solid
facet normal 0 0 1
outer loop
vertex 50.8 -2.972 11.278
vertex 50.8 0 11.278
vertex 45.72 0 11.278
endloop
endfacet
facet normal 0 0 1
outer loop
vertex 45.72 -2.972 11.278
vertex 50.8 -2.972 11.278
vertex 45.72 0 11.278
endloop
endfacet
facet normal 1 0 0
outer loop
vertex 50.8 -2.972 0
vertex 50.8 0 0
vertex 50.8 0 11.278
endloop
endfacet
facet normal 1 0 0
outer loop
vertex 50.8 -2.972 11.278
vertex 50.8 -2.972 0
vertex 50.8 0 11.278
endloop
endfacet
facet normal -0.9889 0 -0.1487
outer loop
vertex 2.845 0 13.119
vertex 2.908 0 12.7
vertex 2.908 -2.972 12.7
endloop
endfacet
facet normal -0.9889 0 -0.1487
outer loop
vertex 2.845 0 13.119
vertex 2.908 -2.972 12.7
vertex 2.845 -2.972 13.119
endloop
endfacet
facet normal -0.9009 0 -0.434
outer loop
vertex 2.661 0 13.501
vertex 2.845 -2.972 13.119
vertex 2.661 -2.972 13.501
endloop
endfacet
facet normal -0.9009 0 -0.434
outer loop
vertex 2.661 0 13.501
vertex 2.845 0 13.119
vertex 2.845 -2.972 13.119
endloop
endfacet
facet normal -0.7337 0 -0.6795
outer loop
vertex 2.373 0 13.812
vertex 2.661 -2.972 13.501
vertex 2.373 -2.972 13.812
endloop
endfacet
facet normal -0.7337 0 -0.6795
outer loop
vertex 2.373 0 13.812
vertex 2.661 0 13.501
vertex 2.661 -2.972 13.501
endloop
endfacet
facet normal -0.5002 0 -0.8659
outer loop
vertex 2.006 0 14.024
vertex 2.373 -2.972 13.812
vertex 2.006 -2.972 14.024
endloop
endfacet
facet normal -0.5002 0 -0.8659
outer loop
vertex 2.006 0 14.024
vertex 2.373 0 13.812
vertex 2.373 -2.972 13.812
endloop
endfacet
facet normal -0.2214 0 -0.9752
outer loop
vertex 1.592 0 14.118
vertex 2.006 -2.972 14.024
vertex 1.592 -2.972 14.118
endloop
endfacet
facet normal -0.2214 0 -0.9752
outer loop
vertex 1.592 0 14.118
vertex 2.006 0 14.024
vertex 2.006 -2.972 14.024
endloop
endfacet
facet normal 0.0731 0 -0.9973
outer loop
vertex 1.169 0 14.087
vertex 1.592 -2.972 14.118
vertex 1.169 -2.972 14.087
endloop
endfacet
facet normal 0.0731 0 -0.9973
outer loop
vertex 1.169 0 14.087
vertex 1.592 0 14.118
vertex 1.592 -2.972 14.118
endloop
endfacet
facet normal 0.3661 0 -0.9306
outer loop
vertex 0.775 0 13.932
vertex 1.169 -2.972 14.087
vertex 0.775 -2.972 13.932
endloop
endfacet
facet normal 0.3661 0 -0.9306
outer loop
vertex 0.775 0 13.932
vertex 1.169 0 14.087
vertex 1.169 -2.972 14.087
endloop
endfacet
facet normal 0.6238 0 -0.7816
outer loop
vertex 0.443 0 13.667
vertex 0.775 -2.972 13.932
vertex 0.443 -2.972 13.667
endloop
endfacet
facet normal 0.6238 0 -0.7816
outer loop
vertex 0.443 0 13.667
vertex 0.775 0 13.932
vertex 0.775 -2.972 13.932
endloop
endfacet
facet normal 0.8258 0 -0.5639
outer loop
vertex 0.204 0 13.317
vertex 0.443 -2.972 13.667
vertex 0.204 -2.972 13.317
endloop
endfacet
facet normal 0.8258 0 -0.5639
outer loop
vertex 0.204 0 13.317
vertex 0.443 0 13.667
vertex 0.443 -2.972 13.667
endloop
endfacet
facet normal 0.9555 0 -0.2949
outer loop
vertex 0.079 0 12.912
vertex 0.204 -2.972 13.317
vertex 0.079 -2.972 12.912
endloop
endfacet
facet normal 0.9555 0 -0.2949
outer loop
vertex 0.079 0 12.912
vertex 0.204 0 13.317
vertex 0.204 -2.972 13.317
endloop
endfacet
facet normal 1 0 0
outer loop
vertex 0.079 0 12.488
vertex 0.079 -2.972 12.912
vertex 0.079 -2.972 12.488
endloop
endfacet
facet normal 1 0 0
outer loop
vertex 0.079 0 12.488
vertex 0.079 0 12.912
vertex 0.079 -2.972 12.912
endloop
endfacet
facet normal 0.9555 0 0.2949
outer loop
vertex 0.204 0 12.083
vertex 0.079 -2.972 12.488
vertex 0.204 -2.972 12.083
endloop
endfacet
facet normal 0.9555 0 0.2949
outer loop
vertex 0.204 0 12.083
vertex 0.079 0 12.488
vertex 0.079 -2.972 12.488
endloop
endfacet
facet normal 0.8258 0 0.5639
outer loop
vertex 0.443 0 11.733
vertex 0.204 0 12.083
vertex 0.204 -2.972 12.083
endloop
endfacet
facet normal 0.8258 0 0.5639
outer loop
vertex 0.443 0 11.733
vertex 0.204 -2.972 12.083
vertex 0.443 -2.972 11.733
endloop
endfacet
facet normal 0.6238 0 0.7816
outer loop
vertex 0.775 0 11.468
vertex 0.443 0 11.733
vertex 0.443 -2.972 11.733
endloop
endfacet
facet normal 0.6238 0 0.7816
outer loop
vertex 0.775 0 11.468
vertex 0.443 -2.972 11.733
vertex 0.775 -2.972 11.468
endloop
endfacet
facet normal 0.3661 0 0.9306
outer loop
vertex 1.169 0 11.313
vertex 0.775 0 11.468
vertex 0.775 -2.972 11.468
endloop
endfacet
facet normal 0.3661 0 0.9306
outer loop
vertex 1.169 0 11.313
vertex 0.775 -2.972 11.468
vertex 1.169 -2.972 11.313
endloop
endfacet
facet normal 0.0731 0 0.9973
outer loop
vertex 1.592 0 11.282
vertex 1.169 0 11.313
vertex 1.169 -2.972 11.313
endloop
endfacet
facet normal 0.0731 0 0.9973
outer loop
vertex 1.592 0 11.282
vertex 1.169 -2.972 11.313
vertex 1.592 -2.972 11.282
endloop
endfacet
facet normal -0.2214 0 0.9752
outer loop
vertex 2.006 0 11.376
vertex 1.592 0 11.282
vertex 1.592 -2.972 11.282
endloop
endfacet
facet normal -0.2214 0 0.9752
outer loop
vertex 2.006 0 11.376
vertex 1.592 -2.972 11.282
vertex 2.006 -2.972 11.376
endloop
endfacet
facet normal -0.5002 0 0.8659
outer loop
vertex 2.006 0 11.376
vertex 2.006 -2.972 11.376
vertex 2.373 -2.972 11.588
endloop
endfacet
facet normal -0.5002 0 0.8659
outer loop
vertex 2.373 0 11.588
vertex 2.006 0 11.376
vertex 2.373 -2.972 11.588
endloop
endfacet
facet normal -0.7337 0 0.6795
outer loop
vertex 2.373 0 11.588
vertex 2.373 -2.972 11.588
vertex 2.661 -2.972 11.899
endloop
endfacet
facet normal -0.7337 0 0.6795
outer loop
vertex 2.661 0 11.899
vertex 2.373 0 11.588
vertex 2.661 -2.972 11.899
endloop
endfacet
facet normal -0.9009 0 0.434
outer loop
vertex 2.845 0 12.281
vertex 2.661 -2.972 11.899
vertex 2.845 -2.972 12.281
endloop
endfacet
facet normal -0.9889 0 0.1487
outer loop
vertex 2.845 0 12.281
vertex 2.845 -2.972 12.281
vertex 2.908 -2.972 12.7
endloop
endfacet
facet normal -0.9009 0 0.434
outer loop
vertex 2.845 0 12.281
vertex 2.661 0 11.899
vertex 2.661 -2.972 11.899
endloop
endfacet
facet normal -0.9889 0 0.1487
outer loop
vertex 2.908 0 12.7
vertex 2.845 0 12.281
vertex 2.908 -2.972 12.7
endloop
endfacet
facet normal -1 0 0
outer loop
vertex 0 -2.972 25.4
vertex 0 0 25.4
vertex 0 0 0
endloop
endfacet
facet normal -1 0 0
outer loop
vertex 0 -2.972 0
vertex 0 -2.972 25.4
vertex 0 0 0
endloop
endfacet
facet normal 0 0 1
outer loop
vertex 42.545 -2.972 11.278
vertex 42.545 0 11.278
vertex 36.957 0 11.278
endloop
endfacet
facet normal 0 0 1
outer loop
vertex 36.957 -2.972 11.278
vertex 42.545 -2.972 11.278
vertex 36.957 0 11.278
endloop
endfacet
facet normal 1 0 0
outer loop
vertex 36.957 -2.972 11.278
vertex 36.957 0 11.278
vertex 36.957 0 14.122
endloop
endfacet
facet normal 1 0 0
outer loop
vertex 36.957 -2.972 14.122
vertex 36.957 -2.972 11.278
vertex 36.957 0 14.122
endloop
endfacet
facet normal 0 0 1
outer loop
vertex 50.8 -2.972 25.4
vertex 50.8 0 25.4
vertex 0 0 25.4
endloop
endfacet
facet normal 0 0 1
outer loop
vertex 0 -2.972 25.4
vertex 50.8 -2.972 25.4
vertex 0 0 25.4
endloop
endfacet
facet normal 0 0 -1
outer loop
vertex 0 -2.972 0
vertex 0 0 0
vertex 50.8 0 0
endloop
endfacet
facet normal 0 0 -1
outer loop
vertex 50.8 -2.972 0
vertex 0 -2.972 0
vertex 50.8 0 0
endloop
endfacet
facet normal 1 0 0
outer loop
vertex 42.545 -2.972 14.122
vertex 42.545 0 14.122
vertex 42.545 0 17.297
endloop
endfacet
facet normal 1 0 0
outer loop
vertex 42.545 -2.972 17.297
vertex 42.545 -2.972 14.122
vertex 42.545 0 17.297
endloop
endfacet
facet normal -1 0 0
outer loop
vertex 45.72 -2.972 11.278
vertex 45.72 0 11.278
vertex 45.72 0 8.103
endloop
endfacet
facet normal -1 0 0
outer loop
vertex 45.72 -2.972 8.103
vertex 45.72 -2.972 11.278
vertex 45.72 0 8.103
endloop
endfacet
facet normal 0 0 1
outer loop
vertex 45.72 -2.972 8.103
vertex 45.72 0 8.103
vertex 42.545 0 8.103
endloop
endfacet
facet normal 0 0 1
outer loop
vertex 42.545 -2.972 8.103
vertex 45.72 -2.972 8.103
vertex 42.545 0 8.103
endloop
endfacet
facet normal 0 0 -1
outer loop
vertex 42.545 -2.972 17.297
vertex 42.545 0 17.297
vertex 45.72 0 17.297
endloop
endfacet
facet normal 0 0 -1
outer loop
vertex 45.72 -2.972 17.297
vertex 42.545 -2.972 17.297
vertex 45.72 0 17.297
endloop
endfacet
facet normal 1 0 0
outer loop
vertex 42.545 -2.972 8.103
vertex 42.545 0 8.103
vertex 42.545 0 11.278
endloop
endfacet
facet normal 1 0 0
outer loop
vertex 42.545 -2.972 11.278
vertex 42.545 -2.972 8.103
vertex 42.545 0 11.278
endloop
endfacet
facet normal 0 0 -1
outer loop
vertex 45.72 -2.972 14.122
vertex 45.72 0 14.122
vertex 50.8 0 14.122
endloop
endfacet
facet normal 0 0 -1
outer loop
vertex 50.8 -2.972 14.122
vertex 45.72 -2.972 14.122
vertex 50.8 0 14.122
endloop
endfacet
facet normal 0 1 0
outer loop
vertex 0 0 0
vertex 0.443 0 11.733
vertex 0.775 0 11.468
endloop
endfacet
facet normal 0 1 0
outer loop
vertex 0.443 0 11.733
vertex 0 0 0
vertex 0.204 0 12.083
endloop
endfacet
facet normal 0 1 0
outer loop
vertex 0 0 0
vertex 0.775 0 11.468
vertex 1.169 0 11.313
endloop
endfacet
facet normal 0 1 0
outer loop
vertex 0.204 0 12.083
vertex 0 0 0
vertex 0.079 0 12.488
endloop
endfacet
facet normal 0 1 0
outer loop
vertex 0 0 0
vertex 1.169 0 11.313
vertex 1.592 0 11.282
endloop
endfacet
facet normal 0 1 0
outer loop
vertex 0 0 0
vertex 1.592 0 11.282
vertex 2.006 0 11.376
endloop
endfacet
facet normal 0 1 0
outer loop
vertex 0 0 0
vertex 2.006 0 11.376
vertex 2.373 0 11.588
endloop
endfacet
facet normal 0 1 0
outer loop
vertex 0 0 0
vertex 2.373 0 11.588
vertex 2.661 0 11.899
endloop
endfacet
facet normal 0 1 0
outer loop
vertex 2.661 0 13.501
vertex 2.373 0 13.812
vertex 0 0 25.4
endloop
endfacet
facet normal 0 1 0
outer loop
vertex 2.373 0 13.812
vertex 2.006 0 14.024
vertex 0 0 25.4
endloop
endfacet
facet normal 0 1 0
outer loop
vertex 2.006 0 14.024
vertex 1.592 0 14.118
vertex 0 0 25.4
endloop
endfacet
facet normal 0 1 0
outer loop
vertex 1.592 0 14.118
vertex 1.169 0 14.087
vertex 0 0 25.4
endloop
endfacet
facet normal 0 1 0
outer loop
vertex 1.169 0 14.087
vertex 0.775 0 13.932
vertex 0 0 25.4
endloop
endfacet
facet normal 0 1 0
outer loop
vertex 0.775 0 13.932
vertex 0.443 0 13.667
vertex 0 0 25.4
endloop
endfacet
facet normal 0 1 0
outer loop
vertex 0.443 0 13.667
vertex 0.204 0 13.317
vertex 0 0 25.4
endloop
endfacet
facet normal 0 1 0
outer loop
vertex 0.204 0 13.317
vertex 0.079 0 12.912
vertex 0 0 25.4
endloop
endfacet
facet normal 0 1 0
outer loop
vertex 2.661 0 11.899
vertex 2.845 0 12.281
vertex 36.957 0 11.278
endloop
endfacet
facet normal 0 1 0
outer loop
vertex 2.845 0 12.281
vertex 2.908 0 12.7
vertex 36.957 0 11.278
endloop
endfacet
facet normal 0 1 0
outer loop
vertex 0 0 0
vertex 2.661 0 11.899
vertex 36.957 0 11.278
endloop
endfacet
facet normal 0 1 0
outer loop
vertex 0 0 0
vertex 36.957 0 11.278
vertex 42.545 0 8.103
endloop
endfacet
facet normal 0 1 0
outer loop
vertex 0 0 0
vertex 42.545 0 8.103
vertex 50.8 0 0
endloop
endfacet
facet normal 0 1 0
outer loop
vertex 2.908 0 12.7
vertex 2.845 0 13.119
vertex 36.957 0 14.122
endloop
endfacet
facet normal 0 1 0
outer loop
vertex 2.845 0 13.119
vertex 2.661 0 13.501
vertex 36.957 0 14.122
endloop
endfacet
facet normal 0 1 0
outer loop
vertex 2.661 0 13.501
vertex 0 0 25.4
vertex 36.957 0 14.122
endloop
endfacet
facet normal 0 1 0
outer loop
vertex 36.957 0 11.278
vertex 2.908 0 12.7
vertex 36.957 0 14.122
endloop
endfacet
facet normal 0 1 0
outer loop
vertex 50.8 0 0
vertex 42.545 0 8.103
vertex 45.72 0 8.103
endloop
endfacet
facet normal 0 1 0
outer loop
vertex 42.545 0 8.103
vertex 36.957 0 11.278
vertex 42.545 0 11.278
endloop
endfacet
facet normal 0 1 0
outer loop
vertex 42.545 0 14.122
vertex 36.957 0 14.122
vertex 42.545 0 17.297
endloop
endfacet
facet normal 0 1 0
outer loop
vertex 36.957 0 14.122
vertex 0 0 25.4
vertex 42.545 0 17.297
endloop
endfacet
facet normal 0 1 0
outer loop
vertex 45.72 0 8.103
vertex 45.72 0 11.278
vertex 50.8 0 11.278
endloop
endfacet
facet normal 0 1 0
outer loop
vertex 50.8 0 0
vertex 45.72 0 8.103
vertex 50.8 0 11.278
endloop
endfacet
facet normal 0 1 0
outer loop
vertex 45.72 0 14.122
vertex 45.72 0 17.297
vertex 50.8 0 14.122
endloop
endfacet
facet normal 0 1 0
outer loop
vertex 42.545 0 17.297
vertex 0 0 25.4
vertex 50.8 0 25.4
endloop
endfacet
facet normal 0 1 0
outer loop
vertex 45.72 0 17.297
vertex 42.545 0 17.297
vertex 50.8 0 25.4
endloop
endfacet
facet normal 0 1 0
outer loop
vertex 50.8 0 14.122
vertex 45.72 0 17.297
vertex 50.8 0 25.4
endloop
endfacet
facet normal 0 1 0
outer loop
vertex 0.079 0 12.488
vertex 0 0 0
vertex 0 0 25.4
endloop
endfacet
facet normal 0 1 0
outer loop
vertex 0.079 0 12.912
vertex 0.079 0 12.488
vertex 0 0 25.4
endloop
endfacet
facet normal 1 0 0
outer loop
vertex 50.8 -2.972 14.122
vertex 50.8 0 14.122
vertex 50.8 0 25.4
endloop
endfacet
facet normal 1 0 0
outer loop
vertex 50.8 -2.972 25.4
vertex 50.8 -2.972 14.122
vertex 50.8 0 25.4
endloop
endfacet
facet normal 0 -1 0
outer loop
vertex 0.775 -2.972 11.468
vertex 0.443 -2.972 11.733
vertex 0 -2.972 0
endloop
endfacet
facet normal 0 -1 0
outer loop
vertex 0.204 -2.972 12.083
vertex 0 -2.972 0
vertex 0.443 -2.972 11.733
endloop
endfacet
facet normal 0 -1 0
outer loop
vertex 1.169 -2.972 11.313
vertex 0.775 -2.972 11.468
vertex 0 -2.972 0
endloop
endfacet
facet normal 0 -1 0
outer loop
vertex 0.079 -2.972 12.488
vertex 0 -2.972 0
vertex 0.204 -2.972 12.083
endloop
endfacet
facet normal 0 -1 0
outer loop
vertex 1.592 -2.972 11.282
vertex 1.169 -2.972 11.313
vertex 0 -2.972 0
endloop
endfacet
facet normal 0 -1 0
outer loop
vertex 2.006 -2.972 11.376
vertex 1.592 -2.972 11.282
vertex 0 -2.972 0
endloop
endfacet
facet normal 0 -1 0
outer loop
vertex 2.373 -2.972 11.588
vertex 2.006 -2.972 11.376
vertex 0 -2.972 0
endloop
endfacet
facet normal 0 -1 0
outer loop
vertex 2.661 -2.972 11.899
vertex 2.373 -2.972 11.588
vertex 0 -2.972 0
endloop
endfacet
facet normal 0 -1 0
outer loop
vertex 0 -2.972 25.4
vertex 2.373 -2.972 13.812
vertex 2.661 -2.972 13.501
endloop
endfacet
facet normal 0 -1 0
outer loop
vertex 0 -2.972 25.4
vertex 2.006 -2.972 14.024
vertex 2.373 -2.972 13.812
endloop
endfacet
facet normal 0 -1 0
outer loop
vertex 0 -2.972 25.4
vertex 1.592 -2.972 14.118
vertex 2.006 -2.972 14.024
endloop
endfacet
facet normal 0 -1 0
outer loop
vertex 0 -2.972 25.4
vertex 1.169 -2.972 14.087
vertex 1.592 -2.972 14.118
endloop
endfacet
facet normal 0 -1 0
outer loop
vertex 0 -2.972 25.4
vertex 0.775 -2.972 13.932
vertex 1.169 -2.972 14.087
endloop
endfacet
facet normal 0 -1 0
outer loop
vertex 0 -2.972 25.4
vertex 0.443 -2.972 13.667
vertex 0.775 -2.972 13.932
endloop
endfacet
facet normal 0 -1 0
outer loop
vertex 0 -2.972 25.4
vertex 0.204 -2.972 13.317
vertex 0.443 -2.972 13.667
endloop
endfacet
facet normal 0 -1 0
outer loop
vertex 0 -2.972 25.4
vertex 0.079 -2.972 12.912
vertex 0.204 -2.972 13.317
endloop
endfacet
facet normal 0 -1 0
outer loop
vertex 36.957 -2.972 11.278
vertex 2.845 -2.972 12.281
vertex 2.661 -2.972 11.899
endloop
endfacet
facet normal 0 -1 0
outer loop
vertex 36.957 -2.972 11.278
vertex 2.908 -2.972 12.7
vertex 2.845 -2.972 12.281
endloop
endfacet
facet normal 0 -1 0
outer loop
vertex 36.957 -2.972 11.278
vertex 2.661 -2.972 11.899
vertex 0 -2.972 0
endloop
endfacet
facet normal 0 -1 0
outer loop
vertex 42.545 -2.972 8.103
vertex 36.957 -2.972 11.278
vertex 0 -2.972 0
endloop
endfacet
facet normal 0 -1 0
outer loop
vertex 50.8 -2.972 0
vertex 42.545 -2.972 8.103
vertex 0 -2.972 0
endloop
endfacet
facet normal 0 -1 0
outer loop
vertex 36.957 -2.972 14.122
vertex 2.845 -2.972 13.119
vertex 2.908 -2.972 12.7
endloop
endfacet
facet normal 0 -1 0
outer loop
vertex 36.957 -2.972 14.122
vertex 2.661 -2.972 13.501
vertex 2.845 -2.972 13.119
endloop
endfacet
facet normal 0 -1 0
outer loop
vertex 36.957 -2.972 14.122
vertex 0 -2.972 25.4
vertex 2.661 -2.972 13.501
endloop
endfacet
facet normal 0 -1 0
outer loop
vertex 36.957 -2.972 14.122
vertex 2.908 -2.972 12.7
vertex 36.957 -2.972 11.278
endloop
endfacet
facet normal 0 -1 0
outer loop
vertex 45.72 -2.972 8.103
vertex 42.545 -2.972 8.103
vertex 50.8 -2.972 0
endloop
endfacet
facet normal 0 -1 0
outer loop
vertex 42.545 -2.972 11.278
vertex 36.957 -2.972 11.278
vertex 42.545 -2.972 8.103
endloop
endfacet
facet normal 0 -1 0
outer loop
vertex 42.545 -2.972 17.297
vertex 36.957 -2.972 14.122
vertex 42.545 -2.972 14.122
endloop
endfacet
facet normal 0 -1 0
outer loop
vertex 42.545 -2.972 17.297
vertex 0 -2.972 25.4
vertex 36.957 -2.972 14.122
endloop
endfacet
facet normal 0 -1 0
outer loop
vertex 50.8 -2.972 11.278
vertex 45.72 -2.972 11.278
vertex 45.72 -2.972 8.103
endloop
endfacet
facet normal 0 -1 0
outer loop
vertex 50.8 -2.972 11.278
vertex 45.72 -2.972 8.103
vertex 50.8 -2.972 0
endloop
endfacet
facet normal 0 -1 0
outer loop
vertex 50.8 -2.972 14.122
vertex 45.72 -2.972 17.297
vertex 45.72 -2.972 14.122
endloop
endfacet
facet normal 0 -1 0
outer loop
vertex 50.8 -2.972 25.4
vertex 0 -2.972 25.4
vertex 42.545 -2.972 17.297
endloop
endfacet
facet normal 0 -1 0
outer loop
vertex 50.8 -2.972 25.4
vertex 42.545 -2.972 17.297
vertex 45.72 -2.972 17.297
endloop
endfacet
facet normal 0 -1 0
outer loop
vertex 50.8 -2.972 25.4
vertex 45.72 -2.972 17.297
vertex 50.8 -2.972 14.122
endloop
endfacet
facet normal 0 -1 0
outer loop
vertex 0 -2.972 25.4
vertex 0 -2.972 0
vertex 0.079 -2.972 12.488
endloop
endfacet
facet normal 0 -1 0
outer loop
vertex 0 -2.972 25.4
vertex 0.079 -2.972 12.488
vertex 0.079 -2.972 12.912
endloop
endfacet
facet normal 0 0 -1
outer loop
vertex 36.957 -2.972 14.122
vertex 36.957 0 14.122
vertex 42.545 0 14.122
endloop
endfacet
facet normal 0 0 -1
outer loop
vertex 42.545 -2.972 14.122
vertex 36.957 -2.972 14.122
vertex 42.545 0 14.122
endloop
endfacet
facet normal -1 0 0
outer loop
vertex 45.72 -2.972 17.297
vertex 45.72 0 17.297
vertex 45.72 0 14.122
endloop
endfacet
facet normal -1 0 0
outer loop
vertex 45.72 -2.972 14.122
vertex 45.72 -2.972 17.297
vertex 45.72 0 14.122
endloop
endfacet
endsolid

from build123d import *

# Parameters (mm, degrees)
F0_R     = 1.4224
F1_DEPTH = 2.9718


with BuildPart() as f1:
    # F0 (on Front) → F1 (new body)
    with BuildSketch(Plane.XZ):
        Polygon((0, 25.4), (0, 0), (50.8, 0), (50.8, 11.2776), (45.72, 11.2776), (45.72, 8.1026), (42.545, 8.1026), (42.545, 11.2776), (36.957, 11.2776), (36.957, 14.1224), (42.545, 14.1224), (42.545, 17.2974), (45.72, 17.2974), (45.72, 14.1224), (50.8, 14.1224), (50.8, 25.4), align=None)
        with Locations((1.4859, 12.7)):
            Circle(F0_R, mode=Mode.SUBTRACT)
    extrude(amount=F1_DEPTH)


solid = f1.part
